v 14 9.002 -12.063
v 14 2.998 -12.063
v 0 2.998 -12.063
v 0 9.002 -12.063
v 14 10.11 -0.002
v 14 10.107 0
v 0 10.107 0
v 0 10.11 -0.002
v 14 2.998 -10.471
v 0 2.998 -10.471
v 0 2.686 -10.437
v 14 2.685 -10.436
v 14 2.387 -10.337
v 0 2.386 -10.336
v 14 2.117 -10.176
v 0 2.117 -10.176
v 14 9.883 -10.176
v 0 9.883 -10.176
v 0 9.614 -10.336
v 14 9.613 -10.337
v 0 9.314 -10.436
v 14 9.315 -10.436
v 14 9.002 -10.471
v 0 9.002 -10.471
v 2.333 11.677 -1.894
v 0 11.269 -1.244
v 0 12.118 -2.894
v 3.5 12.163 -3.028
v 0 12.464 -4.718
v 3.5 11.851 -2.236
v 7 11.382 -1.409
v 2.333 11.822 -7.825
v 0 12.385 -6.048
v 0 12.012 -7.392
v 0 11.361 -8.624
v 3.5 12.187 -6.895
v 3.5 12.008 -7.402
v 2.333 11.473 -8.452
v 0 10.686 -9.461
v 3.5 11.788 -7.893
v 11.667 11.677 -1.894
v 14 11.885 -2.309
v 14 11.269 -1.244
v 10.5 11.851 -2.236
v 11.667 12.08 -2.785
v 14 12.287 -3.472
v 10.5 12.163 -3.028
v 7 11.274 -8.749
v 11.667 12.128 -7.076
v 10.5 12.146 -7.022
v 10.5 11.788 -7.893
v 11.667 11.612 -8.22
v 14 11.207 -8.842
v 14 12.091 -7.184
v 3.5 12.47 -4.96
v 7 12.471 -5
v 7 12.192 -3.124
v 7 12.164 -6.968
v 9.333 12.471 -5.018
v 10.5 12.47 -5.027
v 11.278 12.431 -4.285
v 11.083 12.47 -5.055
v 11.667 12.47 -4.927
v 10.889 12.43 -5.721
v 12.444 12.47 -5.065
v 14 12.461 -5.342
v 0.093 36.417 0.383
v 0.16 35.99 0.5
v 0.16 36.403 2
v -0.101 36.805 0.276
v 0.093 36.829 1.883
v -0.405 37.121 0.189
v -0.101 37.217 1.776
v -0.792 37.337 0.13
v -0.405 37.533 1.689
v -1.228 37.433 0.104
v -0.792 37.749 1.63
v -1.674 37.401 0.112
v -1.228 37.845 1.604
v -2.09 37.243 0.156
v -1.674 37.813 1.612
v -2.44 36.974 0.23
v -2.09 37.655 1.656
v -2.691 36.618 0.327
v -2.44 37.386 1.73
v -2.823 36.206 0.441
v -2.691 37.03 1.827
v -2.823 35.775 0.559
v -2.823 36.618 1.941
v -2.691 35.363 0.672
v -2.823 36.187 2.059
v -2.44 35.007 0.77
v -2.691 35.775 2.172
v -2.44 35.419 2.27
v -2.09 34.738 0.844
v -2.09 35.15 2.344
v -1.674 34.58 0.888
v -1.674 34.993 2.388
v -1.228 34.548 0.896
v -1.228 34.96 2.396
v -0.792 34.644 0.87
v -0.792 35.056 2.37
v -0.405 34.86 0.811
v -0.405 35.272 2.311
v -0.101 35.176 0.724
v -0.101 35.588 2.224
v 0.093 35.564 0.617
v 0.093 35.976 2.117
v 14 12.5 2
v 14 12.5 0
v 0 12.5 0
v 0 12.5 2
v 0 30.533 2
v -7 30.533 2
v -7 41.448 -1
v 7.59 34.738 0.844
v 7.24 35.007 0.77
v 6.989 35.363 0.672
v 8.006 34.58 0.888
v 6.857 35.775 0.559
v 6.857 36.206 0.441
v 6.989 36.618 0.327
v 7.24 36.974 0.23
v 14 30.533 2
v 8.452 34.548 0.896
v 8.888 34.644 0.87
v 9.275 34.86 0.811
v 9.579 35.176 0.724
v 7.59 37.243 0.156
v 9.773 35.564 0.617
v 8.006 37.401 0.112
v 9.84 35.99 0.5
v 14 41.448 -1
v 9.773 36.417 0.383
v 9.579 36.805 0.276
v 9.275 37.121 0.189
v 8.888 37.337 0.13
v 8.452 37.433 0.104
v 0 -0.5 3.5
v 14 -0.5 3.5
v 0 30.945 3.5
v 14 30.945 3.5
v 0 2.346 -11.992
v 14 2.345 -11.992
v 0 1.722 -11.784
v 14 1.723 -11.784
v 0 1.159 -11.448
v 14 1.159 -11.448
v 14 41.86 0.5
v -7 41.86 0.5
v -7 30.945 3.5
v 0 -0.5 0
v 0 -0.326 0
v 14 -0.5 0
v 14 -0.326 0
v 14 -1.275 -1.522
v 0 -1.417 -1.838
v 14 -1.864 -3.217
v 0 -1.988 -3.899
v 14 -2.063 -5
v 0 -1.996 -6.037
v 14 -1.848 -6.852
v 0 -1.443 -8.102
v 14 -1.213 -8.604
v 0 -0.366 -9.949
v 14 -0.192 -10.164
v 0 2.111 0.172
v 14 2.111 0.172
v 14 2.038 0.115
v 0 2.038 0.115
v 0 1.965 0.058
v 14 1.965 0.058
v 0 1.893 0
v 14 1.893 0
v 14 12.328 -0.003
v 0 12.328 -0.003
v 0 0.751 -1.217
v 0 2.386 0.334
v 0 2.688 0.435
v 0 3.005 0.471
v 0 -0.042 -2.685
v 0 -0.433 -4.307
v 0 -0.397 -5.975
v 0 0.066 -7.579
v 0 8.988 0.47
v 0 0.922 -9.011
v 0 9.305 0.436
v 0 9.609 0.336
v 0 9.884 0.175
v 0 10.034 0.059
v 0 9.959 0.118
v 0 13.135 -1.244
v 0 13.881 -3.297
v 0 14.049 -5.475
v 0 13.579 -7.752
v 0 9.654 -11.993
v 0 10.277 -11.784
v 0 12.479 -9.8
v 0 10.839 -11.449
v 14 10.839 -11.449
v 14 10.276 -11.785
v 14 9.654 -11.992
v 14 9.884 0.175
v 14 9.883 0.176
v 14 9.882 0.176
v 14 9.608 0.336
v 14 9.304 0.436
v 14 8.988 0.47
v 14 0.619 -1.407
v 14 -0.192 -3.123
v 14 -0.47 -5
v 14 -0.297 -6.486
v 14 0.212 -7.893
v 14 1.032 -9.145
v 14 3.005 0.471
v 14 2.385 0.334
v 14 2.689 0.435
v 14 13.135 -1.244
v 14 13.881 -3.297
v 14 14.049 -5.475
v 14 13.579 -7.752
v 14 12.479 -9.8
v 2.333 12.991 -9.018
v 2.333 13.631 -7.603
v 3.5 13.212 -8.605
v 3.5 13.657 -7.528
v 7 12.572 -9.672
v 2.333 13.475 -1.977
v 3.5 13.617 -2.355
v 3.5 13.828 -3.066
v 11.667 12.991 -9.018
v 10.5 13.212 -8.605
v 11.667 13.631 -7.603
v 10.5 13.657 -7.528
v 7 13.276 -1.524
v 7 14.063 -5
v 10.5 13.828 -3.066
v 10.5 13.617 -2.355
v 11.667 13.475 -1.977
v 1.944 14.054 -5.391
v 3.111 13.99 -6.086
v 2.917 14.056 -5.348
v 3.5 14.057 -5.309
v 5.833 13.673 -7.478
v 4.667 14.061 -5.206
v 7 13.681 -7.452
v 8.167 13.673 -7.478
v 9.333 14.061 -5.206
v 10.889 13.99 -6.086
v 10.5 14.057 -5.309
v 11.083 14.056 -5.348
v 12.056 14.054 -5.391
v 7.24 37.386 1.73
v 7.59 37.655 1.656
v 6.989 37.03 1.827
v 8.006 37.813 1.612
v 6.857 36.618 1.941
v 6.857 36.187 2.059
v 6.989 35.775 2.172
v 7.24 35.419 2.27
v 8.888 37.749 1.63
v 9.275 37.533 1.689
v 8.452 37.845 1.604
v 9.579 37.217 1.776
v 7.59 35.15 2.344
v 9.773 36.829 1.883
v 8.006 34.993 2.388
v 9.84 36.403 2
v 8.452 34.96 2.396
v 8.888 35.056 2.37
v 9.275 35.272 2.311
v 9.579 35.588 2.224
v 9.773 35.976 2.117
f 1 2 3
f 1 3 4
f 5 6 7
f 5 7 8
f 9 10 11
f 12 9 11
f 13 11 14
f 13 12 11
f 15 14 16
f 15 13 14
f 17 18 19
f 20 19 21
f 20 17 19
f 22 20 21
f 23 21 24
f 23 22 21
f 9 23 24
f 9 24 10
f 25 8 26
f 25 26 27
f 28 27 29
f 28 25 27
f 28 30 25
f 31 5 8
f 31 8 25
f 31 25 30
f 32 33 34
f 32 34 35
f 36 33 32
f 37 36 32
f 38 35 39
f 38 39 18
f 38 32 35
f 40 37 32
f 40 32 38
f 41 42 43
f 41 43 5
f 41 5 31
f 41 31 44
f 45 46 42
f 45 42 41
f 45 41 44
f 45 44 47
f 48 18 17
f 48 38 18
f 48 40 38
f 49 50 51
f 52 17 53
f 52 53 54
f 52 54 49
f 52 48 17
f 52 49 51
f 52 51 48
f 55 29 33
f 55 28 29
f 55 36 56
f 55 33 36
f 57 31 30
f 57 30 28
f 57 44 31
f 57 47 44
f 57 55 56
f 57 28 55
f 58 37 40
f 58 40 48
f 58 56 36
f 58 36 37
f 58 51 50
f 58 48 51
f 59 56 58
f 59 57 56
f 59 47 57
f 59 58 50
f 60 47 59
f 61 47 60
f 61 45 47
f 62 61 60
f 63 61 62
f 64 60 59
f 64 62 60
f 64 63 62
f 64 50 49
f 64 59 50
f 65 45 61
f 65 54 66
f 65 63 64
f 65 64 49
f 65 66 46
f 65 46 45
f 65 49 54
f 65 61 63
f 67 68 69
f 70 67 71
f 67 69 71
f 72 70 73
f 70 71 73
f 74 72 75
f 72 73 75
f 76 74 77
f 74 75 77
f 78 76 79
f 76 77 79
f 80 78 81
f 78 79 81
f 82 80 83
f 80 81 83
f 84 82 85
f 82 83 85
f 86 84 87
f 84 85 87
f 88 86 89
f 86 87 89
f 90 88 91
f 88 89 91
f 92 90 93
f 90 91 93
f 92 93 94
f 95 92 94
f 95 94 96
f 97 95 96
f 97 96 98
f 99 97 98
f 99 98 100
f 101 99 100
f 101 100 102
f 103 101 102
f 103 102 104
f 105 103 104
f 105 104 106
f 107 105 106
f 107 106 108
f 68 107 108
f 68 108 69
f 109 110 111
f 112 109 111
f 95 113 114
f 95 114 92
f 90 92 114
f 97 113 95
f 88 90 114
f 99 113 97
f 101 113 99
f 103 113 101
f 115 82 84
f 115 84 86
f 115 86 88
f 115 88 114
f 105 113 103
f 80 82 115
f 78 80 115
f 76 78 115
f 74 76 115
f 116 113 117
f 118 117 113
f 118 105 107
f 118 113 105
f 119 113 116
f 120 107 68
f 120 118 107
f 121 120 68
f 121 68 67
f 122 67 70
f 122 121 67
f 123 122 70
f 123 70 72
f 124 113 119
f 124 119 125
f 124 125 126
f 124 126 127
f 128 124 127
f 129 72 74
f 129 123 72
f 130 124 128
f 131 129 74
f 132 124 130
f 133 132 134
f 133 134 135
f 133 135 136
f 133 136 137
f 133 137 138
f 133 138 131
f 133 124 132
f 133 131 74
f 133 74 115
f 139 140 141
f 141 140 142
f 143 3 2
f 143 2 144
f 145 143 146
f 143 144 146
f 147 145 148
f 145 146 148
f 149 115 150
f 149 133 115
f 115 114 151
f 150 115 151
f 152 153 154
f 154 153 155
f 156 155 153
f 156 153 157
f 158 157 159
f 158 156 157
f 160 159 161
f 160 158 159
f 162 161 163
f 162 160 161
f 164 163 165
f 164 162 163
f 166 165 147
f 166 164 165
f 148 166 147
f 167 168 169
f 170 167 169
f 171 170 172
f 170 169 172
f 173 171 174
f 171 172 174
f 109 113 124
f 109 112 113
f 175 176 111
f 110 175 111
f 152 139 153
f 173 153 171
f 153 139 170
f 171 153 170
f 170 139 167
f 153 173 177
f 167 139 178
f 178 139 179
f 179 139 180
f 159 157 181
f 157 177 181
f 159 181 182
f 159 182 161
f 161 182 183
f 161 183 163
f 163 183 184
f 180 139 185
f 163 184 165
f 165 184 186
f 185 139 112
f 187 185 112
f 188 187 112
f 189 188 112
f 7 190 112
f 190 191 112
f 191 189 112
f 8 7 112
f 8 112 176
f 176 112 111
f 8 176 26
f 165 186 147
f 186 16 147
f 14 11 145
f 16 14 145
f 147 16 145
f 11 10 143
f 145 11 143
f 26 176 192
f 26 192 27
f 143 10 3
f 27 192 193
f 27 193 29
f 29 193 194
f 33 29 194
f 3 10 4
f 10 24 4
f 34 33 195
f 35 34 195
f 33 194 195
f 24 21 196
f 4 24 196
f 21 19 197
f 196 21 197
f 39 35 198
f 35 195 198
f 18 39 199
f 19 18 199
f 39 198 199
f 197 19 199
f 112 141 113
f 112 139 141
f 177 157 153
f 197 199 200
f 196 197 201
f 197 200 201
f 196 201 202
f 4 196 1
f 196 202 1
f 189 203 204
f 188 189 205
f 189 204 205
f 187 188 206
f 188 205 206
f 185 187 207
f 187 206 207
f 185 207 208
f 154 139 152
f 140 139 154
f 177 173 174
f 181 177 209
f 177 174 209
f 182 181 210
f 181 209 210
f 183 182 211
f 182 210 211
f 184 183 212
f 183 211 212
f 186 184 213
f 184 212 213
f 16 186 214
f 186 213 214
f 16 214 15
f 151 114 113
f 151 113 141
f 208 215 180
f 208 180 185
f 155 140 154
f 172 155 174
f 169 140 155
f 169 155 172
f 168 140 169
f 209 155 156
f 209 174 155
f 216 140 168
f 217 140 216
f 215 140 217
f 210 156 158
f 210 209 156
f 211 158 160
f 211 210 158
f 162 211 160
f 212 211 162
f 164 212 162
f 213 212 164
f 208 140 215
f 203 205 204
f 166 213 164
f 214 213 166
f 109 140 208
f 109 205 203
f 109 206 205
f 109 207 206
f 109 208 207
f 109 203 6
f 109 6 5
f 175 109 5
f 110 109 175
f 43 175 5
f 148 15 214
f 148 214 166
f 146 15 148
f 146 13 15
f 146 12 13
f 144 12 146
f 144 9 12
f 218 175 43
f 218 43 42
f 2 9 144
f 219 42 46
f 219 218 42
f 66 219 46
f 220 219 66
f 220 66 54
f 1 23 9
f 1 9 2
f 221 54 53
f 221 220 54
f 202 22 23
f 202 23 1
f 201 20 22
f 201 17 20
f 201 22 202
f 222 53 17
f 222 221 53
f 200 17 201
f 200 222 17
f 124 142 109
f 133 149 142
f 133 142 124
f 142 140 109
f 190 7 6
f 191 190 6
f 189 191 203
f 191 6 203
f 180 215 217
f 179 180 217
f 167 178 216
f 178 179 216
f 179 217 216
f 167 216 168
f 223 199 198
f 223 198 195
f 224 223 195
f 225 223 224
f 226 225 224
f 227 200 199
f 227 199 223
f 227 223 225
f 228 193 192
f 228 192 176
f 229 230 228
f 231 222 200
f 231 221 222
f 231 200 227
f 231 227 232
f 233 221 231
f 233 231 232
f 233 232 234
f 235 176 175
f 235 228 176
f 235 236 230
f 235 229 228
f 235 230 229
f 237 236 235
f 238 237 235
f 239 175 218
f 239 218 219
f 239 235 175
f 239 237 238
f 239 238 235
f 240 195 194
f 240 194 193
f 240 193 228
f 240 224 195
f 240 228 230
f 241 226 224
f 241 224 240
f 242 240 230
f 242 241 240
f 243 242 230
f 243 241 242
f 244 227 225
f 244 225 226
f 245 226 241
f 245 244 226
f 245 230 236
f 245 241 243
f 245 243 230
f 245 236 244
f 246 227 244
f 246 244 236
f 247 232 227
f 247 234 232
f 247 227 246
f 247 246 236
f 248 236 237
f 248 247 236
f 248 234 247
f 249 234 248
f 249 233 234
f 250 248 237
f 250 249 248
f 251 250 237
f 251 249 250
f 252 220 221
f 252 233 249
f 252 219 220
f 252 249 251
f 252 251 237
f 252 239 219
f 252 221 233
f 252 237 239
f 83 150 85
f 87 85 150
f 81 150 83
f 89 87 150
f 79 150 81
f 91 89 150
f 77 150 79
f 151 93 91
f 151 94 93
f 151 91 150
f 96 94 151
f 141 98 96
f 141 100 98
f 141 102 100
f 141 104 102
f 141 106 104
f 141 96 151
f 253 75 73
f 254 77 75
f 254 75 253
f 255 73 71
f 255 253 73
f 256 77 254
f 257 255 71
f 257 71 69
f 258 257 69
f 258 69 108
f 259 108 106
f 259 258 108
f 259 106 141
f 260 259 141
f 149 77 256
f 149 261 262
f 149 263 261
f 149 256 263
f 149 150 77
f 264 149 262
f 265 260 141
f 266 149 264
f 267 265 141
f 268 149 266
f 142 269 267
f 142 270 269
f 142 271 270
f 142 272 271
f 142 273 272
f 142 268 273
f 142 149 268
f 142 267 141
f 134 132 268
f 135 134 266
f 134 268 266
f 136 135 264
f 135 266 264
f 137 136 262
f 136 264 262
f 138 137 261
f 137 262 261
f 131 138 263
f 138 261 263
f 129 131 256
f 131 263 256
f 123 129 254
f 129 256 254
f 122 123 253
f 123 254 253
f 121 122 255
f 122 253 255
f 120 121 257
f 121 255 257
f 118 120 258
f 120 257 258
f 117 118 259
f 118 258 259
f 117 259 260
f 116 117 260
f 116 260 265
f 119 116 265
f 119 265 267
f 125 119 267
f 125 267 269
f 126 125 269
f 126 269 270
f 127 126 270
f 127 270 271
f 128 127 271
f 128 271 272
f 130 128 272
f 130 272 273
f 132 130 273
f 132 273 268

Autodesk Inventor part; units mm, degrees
ref_plane "YZ Plane" through (0, 0, 0) normal (1, 0, 0) x (0, 1, 0)
ref_plane "XZ Plane" through (0, 0, 0) normal (0, 1, 0) x (-1, 0, 0)
sketch "Sketch1" plane through (0, 0, 0) normal (0, 0, 1) x (1, 0, 0)
  line L0 (1, 9) -> (14, 9) projected
  line L1 (1, 3) -> (1, 9) projected
  line L2 (14, 3) -> (1, 3) projected
  line L3 (14, 9) -> (14, 3) projected
  line L4 (1, 12) -> (14, 12)
  line L5 (1, 0) -> (14, 0)
  line L6 (1, 12.5) -> (14, 12.5)
  line L7 (1, -0.5) -> (14, -0.5)
  line L8 (0, 1.4) -> (0, 10.6) projected
  line L9 (0, -0.5) -> (14, -0.5)
  line L10 (14, -0.5) -> (14, 12.5)
  line L11 (14, 12.5) -> (0, 12.5)
  line L12 (0, 12.5) -> (0, -0.5)
  point P0 (0, 0)
  dimension "d0" = 0.5
  dimension "d1" = 0.5
extrude "Extrusion1" add sketch "Sketch1" along normal blind 2
sketch "Sketch2" plane through (14, -0.5, 0) normal (1, 0, 0) x (0, 0, -1)
  line L0 (10, 9.5) -> (10, 3.5) projected
  line L1 (10.5, 9.5) -> (10.5, 3.5)
  line L2 (0, 13) -> (0, 0) projected
  line L3 (0.0028, 13) -> (0, 0)
  arc A0 (5, 0.5) -> (9.8, 2.9) centre (5, 6.5) ccw projected
  spline S0 degree 3 poles (9.8, 10.1) (9.3822, 10.6561) (8.439, 11.5426) (6.738, 12.3306) (5.0002, 12.5848) (3.2616, 12.3308) (1.5615, 11.5422) (0.6175, 10.6564) (0.2, 10.1) knots 0.000048 0.000048 0.000048 0.000048 1.982593 3.634064 5.285536 6.937008 8.58848 10.571071 10.571071 10.571071 10.571071 weights 1 1 1 1 1 1 1 1 1 projected
  arc A1 (0.2, 2.9) -> (5, 0.5) centre (5, 6.5) ccw projected
  ellipse E0 centre (0.7683, 3.4229) end of major axis (0.4925, 4.2518) minor radius 0.7558 (0, 3.5) -> (0.2, 2.9) ccw projected
  ellipse E1 centre (0.7685, 9.5775) end of major axis (1.0457, 10.4061) minor radius 0.7558 (0.2, 10.1) -> (0, 9.5) ccw projected
  ellipse E2 centre (9.2317, 3.4229) end of major axis (9.5075, 4.2518) minor radius 0.7558 (9.8, 2.9) -> (10, 3.5) ccw projected
  ellipse E3 centre (9.2318, 9.5768) end of major axis (8.9568, 10.4058) minor radius 0.7558 (10, 9.5) -> (9.7999, 10.1) ccw projected
  arc A2 (5, 0.0295) -> (10.1758, 2.6168) centre (5, 6.5) ccw
  arc A3 (-0.1717, 2.6115) -> (5, 0.0295) centre (5, 6.5) ccw
  line L4 (10.4705, 3.4977) -> (10.4705, 9.5023)
  ellipse E4 centre (0.7683, 3.4229) end of major axis (0.3339, 4.718) minor radius 1.2242 (-0.4709, 3.5051) -> (-0.1717, 2.6115) ccw
  ellipse E5 centre (0.7685, 9.5775) end of major axis (1.1957, 10.8767) minor radius 1.2233 (-0.1748, 10.3845) -> (-0.4697, 9.4882) ccw
  arc A4 (0.2, 2.9) -> (9.8, 2.9) centre (5, 6.5) ccw projected
  arc A5 (5, -1.5631) -> (11.4481, 1.6589) centre (5, 6.5) ccw
  arc A6 (-1.4235, 1.6263) -> (5, -1.5631) centre (5, 6.5) ccw
  line L5 (12.0631, 3.4977) -> (12.0631, 9.5023)
  ellipse E6 centre (0.7683, 3.4229) end of major axis (-0.2657, 6.5587) minor radius 2.7801 (-2.0629, 3.5774) -> (-1.4235, 1.6263) ccw
  ellipse E7 centre (0.7685, 9.5775) end of major axis (1.7896, 12.7173) minor radius 2.7798 (-1.4322, 11.3622) -> (-2.0617, 9.4138) ccw
  line L6 (-0.4709, 3.5051) -> (-0.4697, 9.4882)
  line L7 (-2.0629, 3.5774) -> (-2.0617, 9.4138)
  spline S1 degree 5 poles (10.1762, 10.3826) (9.455, 11.3411) (8.5153, 12.1382) (7.3995, 12.6912) (5.0003, 13.2497) (2.6, 12.6917) (1.4857, 12.137) (0.5444, 11.3415) (-0.1764, 10.3824) knots 0 0 0 0 0 0 0.499984 0.499984 0.499984 1 1 1 1 1 1
  spline S2 degree 3 poles (10.1759, 2.6167) (10.3655, 2.8683) (10.4707, 3.1827) (10.4707, 3.4977) knots 0 0 0 0 1 1 1 1
  spline S3 degree 3 poles (10.4707, 9.5023) (10.4707, 9.8173) (10.3655, 10.1318) (10.1757, 10.3833) knots 0 0 0 0 1 1 1 1
  spline S4 degree 4 poles (11.4481, 1.6589) (11.7448, 2.0529) (11.9559, 2.5113) (12.0631, 3.0045) (12.0631, 3.4977) knots 0 0 0 0 0 1 1 1 1 1
  spline S5 degree 4 poles (12.0631, 9.5023) (12.0631, 9.995) (11.9561, 10.4877) (11.7455, 10.9457) (11.4492, 11.3395) knots 0 0 0 0 0 1 1 1 1 1
  spline S6 degree 5 poles (11.4495, 11.3391) (10.5511, 12.5335) (9.3795, 13.5256) (7.9898, 14.2154) (5.0062, 14.9093) (2.0215, 14.2187) (0.6377, 13.5325) (-0.5334, 12.5493) (-1.4322, 11.3622) knots 0 0 0 0 0 0 0.500955 0.500955 0.500955 1 1 1 1 1 1
  point P0 (0, 0.5)
  point P1 (0, 10.6069)
  point P2 (0, 12.8255)
  point P3 (0, 0.1744)
  point P4 (0, 2.393)
  point P5 (0.0005, 2.3924)
  point P6 (0, 0.1743)
  point P7 (0.0027, 12.8276)
  point P8 (0.0023, 10.6096)
extrude "Extrusion2" add sketch "Sketch2" along normal blind 2 contours L3 S6 S5 L5 S4 A5 A6 L2 A3 A2 S2 L4 S3 S1 | S1 E5 L6 E4 A3 L2 A6 E6 L7 E7 S6
sketch "Sketch3" plane through (14, 1.893, 0) normal (1, 0, 0) x (0, 0, -1)
  arc A0 (-0.1717, 0.2185) -> (0, 0) centre (5, 4.107) ccw projected
  line L0 (0, 0) -> (0, 8.2139) projected
  arc A1 (0, 8.2139) -> (-0.1748, 7.9915) centre (4.9785, 4.1209) ccw projected
  ellipse E0 centre (0.7685, 7.1845) end of major axis (0.3413, 5.8853) minor radius 1.2233 (-0.1748, 7.9915) -> (-0.4697, 7.0952) ccw projected
  line L1 (-0.4697, 7.0952) -> (-0.4709, 1.1121) projected
  ellipse E1 centre (0.7683, 1.03) end of major axis (1.2028, -0.2651) minor radius 1.2242 (-0.4709, 1.1121) -> (-0.1717, 0.2185) ccw projected
  point P0 (0, -1.893)
extrude "Extrusion3" cut sketch "Sketch3" against normal through all
sketch "Sketch4" plane through (14, -0.5, 0) normal (-1, 0, 0) x (0, 0, 1)
  line L0 (-10.4705, 9.5023) -> (-10.4705, 3.4977) projected
  ellipse E0 centre (-9.2512, 9.5832) end of major axis (-8.8307, 10.8511) minor radius 1.2058 (-10.1756, 10.3833) -> (-10.4705, 9.5023) ccw projected
  spline S0 degree 5 poles (-0.0023, 10.6096) (-0.7281, 11.4914) (-1.6474, 12.2152) (-2.7157, 12.7179) (-5.0579, 13.2362) (-7.3991, 12.6912) (-8.5148, 12.1385) (-9.4545, 11.3415) (-10.1756, 10.3833) knots 0 0 0 0 0 0 0.487709 0.487709 0.487709 1 1 1 1 1 1 projected
  line L1 (-0.0027, 12.8276) -> (-0.0023, 10.6096) projected
  spline S1 degree 5 poles (-11.4492, 11.3395) (-10.5511, 12.5335) (-9.3795, 13.5256) (-7.9898, 14.2154) (-5.4174, 14.8137) (-2.8441, 14.3827) (-1.8061, 14.0228) (-0.8486, 13.496) (-0.0027, 12.8277) knots 0 0 0 0 0 0 0.581033 0.581033 0.581033 1 1 1 1 1 1 projected
  ellipse E1 centre (-9.2769, 9.5918) end of major axis (-8.3583, 12.3614) minor radius 2.7713 (-11.4492, 11.3395) -> (-12.0631, 9.5023) ccw projected
  line L2 (-12.0631, 3.4977) -> (-12.0631, 9.5023) projected
  ellipse E2 centre (-9.2769, 3.4079) end of major axis (-10.1984, 6.1767) minor radius 2.7712 (-12.0631, 3.4977) -> (-11.4481, 1.6589) ccw projected
  arc A0 (-11.4481, 1.6589) -> (0, 0.1743) centre (-5, 6.5) ccw projected
  line L3 (-0.0005, 2.3924) -> (0, 0.1743) projected
  arc A1 (-10.1758, 2.6168) -> (-0.0005, 2.3924) centre (-5, 6.5) ccw projected
  ellipse E3 centre (-9.2512, 3.4164) end of major axis (-9.673, 4.684) minor radius 1.2058 (-10.4705, 3.4977) -> (-10.1758, 2.6168) ccw projected
  point P0 (0, 0.5)
extrude "Extrusion4" add sketch "Sketch4" along normal up to surface (14 mm away)
sketch "Sketch5" plane through (0, -0.5, 0) normal (0, -1, 0) x (1, 0, 0)
  line L0 (0, 2) -> (14, 2) projected
  line L1 (0, 2) -> (14, 2)
  line L2 (14, 2) -> (14, 3.5)
  line L3 (14, 3.5) -> (0, 3.5)
  line L4 (0, 3.5) -> (0, 2)
  point P0 (0, 0)
  dimension "d22" = 1.5
ref_plane "Work Plane1" through (-71.4012, 38.5222, -12.5) normal (0.0153412, 0.9998823, 0) x (0, 0, 1)
extrude "Extrusion5" add sketch "Sketch5" against normal up to surface surface through (-71.4012, 38.5222, -12.5) normal (0.0153412, 0.9998823, 0)
sketch "Sketch6" plane through (0, -0.5, 3.5) normal (0, 0, 1) x (1, 0, 0)
  line L0 (14, 0) -> (14, 37.7119) projected
  line L1 (14, 37.7119) -> (0, 37.9267) projected
  line L2 (-54.2389, 27.7576) -> (-67.6625, 27.9635) projected
  line L3 (14, 37.7119) -> (14, 26.7106)
  line L4 (14, 13) -> (14, 37.7119) projected
  line L5 (14, 26.7106) -> (-6.9975, 27.0328)
  line L6 (14, 37.7119) -> (-6.9975, 38.034)
  line L7 (-6.9975, 38.034) -> (-6.9975, 27.0328)
  point P0 (0, 0.5)
  point P1 (4.9084, 26.8501)
  dimension "d25" = 21
  dimension "d26" = 21
extrude "Extrusion6" add sketch "Sketch6" against normal blind 1.5
sketch "Sketch7" plane through (0, -0.5, 3.5) normal (0, 0, 1) x (1, 0, 0)
  line L0 (14, 0) -> (14, 37.7119) projected
  line L1 (14, -3.9463) -> (21.7341, -3.9463)
  line L2 (21.7341, -3.9463) -> (21.7341, 19.3789)
  line L3 (21.7341, 19.3789) -> (14, 19.3789)
  line L4 (14, 19.3789) -> (14, -3.9463)
  point P0 (0, 0.5)
extrude "Extrusion7" cut sketch "Sketch7" against normal blind 15.75
sketch "Sketch8" plane through (14, 10.1069, 0) normal (1, 0, 0) x (0, 0, -1)
  ellipse E0 centre (9.2512, -1.0236) end of major axis (8.8307, 0.2442) minor radius 1.2058 (10.4705, -1.1046) -> (10.1756, -0.2236) ccw projected
  line L0 (10.4705, -7.1091) -> (10.4705, -1.1046) projected
  ellipse E1 centre (9.2512, -7.1904) end of major axis (9.673, -5.9229) minor radius 1.2058 (10.1758, -7.9901) -> (10.4705, -7.1091) ccw projected
  arc A0 (0.0005, -8.2145) -> (10.1758, -7.9901) centre (5, -4.1069) ccw projected
  line L1 (0, -10.4326) -> (0.0005, -8.2145) projected
  arc A1 (0, -10.4326) -> (11.4481, -8.948) centre (5, -4.1069) ccw projected
  ellipse E2 centre (9.2769, -7.199) end of major axis (10.1984, -4.4302) minor radius 2.7712 (11.4481, -8.948) -> (12.0631, -7.1091) ccw projected
  line L2 (12.0631, -1.1046) -> (12.0631, -7.1091) projected
  ellipse E3 centre (9.2769, -1.0151) end of major axis (8.3583, 1.7545) minor radius 2.7713 (12.0631, -1.1046) -> (11.4492, 0.7326) ccw projected
  spline S0 degree 5 poles (0.0027, 2.2208) (0.8486, 2.8891) (1.8061, 3.4159) (2.8441, 3.7759) (5.4174, 4.2068) (7.9898, 3.6085) (9.3795, 2.9188) (10.5511, 1.9266) (11.4492, 0.7326) knots 0 0 0 0 0 0 0.418967 0.418967 0.418967 1 1 1 1 1 1 projected
  line L3 (0.0023, 0.0028) -> (0.0027, 2.2208) projected
  spline S1 degree 5 poles (10.1756, -0.2236) (9.4545, 0.7346) (8.5148, 1.5316) (7.3991, 2.0844) (5.0579, 2.6294) (2.7157, 2.111) (1.6474, 1.6084) (0.7281, 0.8845) (0.0023, 0.0027) knots 0 0 0 0 0 0 0.512291 0.512291 0.512291 1 1 1 1 1 1 projected
  arc A2 (-0.1717, -7.9954) -> (0, -8.2139) centre (5, -4.1069) ccw projected
  ellipse E4 centre (0.7683, -7.184) end of major axis (1.2028, -8.479) minor radius 1.2242 (-0.4709, -7.1018) -> (-0.1717, -7.9954) ccw projected
  ellipse E5 centre (0.7685, -1.0294) end of major axis (0.3413, -2.3286) minor radius 1.2233 (-0.1748, -0.2224) -> (-0.4697, -1.1187) ccw projected
  arc A3 (0, 0) -> (-0.1748, -0.2224) centre (4.9785, -4.093) ccw projected
  line L4 (-0.4697, -1.1187) -> (-0.4709, -7.1018) projected
  line L5 (0, 0) -> (0, 2.3931) projected
  line L6 (0, 2.3931) -> (-2, 2.3931) projected
  line L7 (0, -10.6069) -> (0, -8.2139) projected
  line L8 (0, -10.6069) -> (-3.5, -10.6069) projected
  line L9 (1.2443, -11.2419) -> (1.2443, -9.3759)
  arc A4 (0.0005, -8.2145) -> (10.1758, -7.9901) centre (5, -4.1069) ccw projected
  arc A5 (0.0005, -8.2145) -> (1.2443, -9.3759) centre (4.9979, -4.1091) ccw
  line L10 (0, -8.2139) -> (-0.1717, -7.9954)
  ellipse E6 centre (0.7683, -7.184) end of major axis (1.2028, -8.479) minor radius 1.2242 (-0.4709, -7.1018) -> (-0.1717, -7.9954) ccw projected
  line L11 (-0.1717, -7.9954) -> (-0.1717, -10.6069)
  line L12 (0, -10.6069) -> (-0.1717, -10.6069)
  line L13 (0, -10.6069) -> (0, -10.4326)
  arc A6 (0, -10.4326) -> (1.2443, -11.2419) centre (5, -4.1069) ccw
  line L14 (1.2444, 1.1622) -> (1.2444, 3.0282)
  arc A7 (1.2444, 3.0282) -> (0.0027, 2.2208) centre (4.9892, -4.0883) ccw
  line L15 (0, 2.3931) -> (0, 0) projected
  line L16 (0.0027, 2.2208) -> (0, 2.3931)
  line L17 (0, 2.3931) -> (-0.1717, 2.3931)
  line L18 (-0.1717, 2.3931) -> (-0.1748, -0.2224)
  line L19 (-0.1748, -0.2224) -> (0.0023, 0.0028)
  line L20 (0.0005, -8.2145) -> (0, -8.2139)
  point P0 (0, -10.1069)
extrude "Extrusion8" add sketch "Sketch8" against normal up to surface (14 mm away) contours S1 L3 S0 L14 | L19 L5 L16 L3 | L9 A1 L1 A0 | A3 L18 L6 L5 | L1 L7 L8 L11 A2
sketch "Sketch9" plane through (0, -0.5, 3.5) normal (0, 0, 1) x (1, 0, 0)
  line L0 (0, 0) -> (0, 26.9254) projected
  line L1 (14, 0) -> (0, 0) projected
  line L2 (14, 0) -> (14, 37.7119) projected
  line L3 (14, 37.7119) -> (-6.9975, 38.034) projected
  line L4 (-6.9975, 38.034) -> (-6.9975, 27.0328) projected
  line L5 (-6.9975, 27.0328) -> (0, 26.9254) projected
  line L6 (-6.9975, 38.034) -> (14, 37.7119) projected
  line L7 (-6.9975, 38.034) -> (14, 26.7132)
  line L8 (14, 13) -> (14, 37.7119) projected
  line L9 (14, 37.7119) -> (-6.9975, 27.0328)
  line L10 (-6.9975, 38.034) -> (-6.9975, 27.0328) projected
  line L11 (-6.9975, 32.3723) -> (14, 32.3723)
  line L12 (-6.9975, 32.3723) -> (0.0025, 32.3723)
  line L13 (14, 32.3723) -> (7, 32.3723)
  line L14 (-6.9975, 32.3723) -> (-1.9975, 32.3723)
  line L15 (14, 32.3723) -> (9, 32.3723)
  circle A0 centre (-1.9975, 32.3723) radius 1.5
  circle A1 centre (9, 32.3723) radius 1.5
  point P0 (0, 0.5)
  dimension "d35" = 5
  dimension "d36" = 5
  dimension "d37" = 3
  dimension "d38" = 3
extrude "Extrusion9" cut sketch "Sketch9" against normal blind 3 contours A0 L11 | L11 A0 | A1 L11 | L11 A1
sketch "Sketch10" plane through (14, 2.9977, -12.0631) normal (1, 0, 0) x (0, 0, -1)
  line L0 (-12.0631, 9.5023) -> (-14.0631, 9.5023) projected
  line L1 (-15.5631, -3.4977) -> (-15.5631, 34.2141) projected
  line L2 (-15.5631, 23.535) -> (-15.5631, 23.4276) projected
  line L3 (-15.5631, 23.535) -> (-14.0631, 23.535) projected
  line L4 (-14.0631, 9.5023) -> (-14.0631, 34.2141) projected
  line L5 (-14.0631, 34.2141) -> (-15.5631, 34.2141) projected
  line L6 (-15.5631, 34.2141) -> (-12.5631, 34.2141)
  line L7 (-14.0631, 34.2141) -> (-11.0631, 34.2141)
  line L8 (-14.0631, 23.535) -> (-11.0631, 34.2141)
  line L9 (-11.0631, 34.2141) -> (-12.5072, 34.6198)
  line L10 (-12.5072, 34.6198) -> (-15.5631, 23.535)
  point P0 (-12.0631, -2.9977)
  point P1 (-12.6191, 34.2141)
  point P2 (-14.0631, 28.976)
  point P3 (-12.5631, 34.2141)
  dimension "d41" = 3
  dimension "d42" = 3
  dimension "d43" = 1.5
extrude "Extrusion10" add sketch "Sketch10" against normal up to surface (20.9975 mm away) contours L4 L10 L6 L7 L8
sketch "Sketch11" plane through (14, 2.9977, -12.0631) normal (1, 0, 0) x (0, 0, -1)
  line L0 (-15.5631, -3.4977) -> (-15.5631, 34.2141) projected
  line L1 (-14.0631, 28.976) -> (-14.0631, 34.2141) projected
  line L2 (-15.5631, 34.5363) -> (-14.0631, 34.5363) projected
  line L3 (-15.5631, 34.2141) -> (-15.5631, 34.5363) projected
  line L4 (-14.0631, 34.5363) -> (-14.0631, 34.2141) projected
  line L5 (-12.6191, 34.2141) -> (-14.0631, 28.976) projected
  line L6 (-15.5631, 23.535) -> (-14.0631, 23.535) projected
  line L7 (-12.6191, 34.2141) -> (-15.5631, 23.535)
  point P0 (-12.0631, -2.9977)
  point P1 (-14.0631, 28.976)
extrude "Extrusion11" cut sketch "Sketch11" against normal through all
sketch "Sketch12" plane through (-6.9975, 26.5328, 3.5) normal (0, 0.2657691, 0.9640367) x (1, 0, 0)
  ellipse E0 centre (15.9975, 5.5388) end of major axis (15.9975, 3.9828) minor radius 1.5 (14.501, 5.644) -> (17.4941, 5.644) ccw projected
  ellipse E1 centre (5, 5.5388) end of major axis (5, 3.9828) minor radius 1.5 (3.5034, 5.644) -> (6.4966, 5.644) ccw projected
  line L0 (17.4941, 5.644) -> (14.501, 5.644) projected
  line L1 (6.4966, 5.644) -> (3.5034, 5.644) projected
  point P0 (6.9975, -24.6484)
extrude "Extrusion12" add sketch "Sketch12" against normal up to surface surface through (14, 37.2119, -1) normal (0, -0.2704527, -0.9627333)
sketch "Sketch13" plane through (-6.9975, 26.5328, 3.5) normal (0, 0.2657691, 0.9640367) x (1, 0, 0)
  line L0 (0, 0.3987) -> (20.9975, 0.3987) projected
  line L1 (20.9975, 11.0775) -> (20.9975, 0) projected
  line L2 (20.9975, 11.0775) -> (0, 11.0775) projected
  line L3 (0, 0) -> (0, 11.0775) projected
  circle A0 centre (15.6581, 5.7381) radius 5.3394
  circle A1 centre (5.3394, 5.7381) radius 5.3394
  circle A2 centre (15.6581, 5.7381) radius 1.5
  circle A3 centre (5.3394, 5.7381) radius 1.5
  point P0 (6.9975, -24.6484)
  dimension "d50" = 3
  dimension "d51" = 3
extrude "Extrusion13" cut sketch "Sketch13" against normal through all contours A2 | A3
sketch "Sketch14" plane through (14, 2.9977, -12.0631) normal (1, 0, 0) x (0, 0, -1)
  line L0 (-12.6191, 34.2141) -> (-15.5631, 23.535) projected
  line L1 (-14.0631, 23.535) -> (-11.0631, 34.2141) projected
  line L2 (-11.0631, 34.2141) -> (-12.6191, 34.2141) projected
  line L3 (-15.5631, -3.4977) -> (-15.5631, 23.535) projected
  line L4 (-15.5631, 23.535) -> (-14.0631, 23.535)
  point P0 (-12.0631, -2.9977)
extrude "Extrusion14" cut sketch "Sketch14" against normal through all
sketch "Sketch15" plane through (0, 2.9977, -12.0631) normal (-1, 0, 0) x (0, 0, 1)
  line L0 (15.5631, 23.4276) -> (14.0631, 23.4276) projected
  line L1 (15.5631, 23.535) -> (15.5631, 23.4276) projected
  line L2 (15.5631, 23.535) -> (14.0631, 23.535) projected
  line L3 (14.0631, 23.4276) -> (14.0631, 23.535) projected
  point P0 (12.0631, -2.9977)
extrude "Extrusion15" cut sketch "Sketch15" along normal blind 10
sketch "Sketch17" plane through (14, 26.5328, 3.5) normal (0, 1, 0) x (1, 0, 0)
  line L0 (-14, 1.5) -> (-14, 0) projected
  line L1 (0, 0) -> (-14, 0) projected
  line L2 (0, 1.5) -> (0, 0) projected
  line L3 (-14, 1.5) -> (0, 1.5) projected
  point P0 (-14, 3.5)
extrude "Extrusion16" add sketch "Sketch17" along normal blind 4
sketch "Sketch18" plane through (14, 2.9977, -12.0631) normal (1, 0, 0) x (0, 0, -1)
  line L0 (-15.5631, 27.535) -> (-14.0631, 27.535) projected
  line L1 (-14.0631, 9.5023) -> (-14.0631, 27.535) projected
  line L2 (-14.0631, 27.535) -> (-11.0631, 27.535)
  line L3 (-14.0631, 27.535) -> (-11.0631, 38.4502)
  line L4 (-15.5631, -3.4977) -> (-15.5631, 27.535) projected
  line L5 (-15.5631, 27.535) -> (-15.5631, 27.9473)
  line L6 (-15.5631, 27.9473) -> (-12.5631, 38.8625)
  line L7 (-12.5631, 38.8625) -> (-11.0631, 38.4502)
  point P0 (-12.0631, -2.9977)
  dimension "d60" = 3
  dimension "d61" = 11.32
extrude "Extrusion17" add sketch "Sketch18" against normal up to surface (14 mm away)
sketch "Sketch19" plane through (0, 2.9977, -12.0631) normal (-1, 0, 0) x (0, 0, 1)
  line L0 (14.0631, 27.535) -> (11.0631, 38.4502) projected
  line L1 (11.0631, 38.4502) -> (12.5631, 38.8625) projected
  line L2 (12.5631, 38.8625) -> (15.5631, 27.9473) projected
  line L3 (14.0631, 27.535) -> (15.5631, 27.9473)
  point P0 (12.0631, -2.9977)
extrude "Extrusion18" add sketch "Sketch19" along normal blind 7
sketch "Sketch20" plane through (-7, 41.8603, 0.5) normal (0, 0.2650177, 0.9642436) x (1, 0, 0)
  line L0 (21, -11.32) -> (7, -11.32) projected
  line L1 (21, 0) -> (21, -11.32) projected
  line L2 (21, 0) -> (0, 0) projected
  line L3 (0, -11.32) -> (0, 0) projected
  line L4 (7, -11.32) -> (0, -11.32) projected
  circle A0 centre (5.66, -5.66) radius 5.66
  circle A1 centre (15.34, -5.66) radius 5.66
  circle A2 centre (15.34, -5.66) radius 1.5
  circle A3 centre (5.66, -5.66) radius 1.5
  point P0 (7, -40.231)
  dimension "d66" = 3
  dimension "d67" = 3
extrude "Extrusion19" cut sketch "Sketch20" against normal blind 7 contours A2 | A3
equation "\"d39\" = d37"
properties part number "leftWheeler_3DPrint"
